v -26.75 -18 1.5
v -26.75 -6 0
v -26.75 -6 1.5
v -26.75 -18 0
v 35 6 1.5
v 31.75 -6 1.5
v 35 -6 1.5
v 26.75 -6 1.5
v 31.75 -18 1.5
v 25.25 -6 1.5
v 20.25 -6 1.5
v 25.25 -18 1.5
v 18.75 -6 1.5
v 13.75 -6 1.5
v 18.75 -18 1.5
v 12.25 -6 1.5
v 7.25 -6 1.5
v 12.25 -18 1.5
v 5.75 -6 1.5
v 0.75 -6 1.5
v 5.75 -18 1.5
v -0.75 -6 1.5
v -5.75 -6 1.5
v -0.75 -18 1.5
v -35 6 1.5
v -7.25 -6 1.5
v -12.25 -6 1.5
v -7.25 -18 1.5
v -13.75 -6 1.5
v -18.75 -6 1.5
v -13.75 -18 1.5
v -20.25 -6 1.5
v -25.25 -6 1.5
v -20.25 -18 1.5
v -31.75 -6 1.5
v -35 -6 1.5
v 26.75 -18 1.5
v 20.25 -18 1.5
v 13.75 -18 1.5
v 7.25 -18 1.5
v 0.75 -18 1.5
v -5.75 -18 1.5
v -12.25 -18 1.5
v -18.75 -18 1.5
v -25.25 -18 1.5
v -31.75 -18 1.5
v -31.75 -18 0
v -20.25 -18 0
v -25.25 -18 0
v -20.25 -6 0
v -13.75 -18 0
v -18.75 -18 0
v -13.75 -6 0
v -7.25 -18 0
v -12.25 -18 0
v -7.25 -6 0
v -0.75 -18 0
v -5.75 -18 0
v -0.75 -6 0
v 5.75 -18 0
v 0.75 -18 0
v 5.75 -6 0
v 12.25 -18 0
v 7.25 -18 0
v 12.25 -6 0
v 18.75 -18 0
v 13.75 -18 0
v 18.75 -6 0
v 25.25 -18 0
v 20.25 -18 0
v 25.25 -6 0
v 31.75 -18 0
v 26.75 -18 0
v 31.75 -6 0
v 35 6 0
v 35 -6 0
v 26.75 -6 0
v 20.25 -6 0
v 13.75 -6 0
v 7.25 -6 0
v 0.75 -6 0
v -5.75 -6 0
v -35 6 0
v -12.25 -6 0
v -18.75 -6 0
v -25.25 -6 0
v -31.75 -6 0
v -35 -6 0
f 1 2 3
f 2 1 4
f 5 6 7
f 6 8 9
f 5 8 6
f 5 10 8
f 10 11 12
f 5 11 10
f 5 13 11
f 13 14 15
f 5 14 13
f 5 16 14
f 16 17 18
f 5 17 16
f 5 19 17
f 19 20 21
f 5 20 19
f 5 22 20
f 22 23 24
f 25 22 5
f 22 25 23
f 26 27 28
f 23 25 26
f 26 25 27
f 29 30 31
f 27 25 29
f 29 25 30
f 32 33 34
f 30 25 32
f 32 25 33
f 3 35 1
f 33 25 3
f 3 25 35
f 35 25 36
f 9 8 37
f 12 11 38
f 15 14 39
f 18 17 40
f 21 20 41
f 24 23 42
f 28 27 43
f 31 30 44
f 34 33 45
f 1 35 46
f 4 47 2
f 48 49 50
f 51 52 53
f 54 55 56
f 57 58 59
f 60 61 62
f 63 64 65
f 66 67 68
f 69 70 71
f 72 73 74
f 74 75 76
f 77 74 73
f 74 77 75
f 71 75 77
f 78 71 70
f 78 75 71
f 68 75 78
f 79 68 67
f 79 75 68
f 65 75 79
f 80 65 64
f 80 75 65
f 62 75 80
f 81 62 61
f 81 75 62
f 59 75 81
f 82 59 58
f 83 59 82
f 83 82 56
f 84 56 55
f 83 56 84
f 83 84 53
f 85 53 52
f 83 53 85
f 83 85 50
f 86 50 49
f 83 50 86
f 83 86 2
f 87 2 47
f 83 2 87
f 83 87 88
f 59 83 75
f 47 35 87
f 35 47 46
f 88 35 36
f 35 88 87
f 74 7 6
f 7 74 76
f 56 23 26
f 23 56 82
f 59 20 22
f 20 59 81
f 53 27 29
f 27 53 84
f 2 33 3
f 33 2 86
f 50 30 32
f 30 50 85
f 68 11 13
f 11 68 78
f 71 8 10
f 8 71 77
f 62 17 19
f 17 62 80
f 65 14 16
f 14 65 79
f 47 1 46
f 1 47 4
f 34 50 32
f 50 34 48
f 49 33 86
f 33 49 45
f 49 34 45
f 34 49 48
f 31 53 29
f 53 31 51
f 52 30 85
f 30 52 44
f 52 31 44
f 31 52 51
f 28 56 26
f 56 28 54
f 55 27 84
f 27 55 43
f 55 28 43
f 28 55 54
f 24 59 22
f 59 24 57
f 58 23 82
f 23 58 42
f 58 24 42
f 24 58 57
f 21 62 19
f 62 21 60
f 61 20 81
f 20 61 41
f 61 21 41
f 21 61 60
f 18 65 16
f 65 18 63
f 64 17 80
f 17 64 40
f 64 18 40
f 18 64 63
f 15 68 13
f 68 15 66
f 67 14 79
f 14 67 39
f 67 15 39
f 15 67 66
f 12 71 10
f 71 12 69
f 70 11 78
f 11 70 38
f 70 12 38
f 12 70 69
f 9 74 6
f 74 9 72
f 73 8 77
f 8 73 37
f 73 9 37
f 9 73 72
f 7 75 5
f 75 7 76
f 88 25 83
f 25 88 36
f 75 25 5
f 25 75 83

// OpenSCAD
// 10-well agarose gel comb
// Designed to be printed lying flat on the XY plane.

// --- Dimensions ---
spine_l      = 70.0;  // Length of the spine (X)
spine_w      = 12.0;  // Width of the spine (Y)
plate_t      = 1.5;   // Thickness of the plate (Z)
tooth_w      = 5.0;   // Width of each tooth (X)
tooth_l      = 12.0;  // Length of each tooth (Y)
gap_w        = 1.5;   // Gap between teeth (X)
num_teeth    = 10;    // Number of teeth

$fn = 64;

// --- Calculations ---
// Total width of the tooth array (teeth + gaps)
// For 10 teeth, there are 9 gaps.
array_total_w = (num_teeth * tooth_w) + ((num_teeth - 1) * gap_w);

// The teeth hang from one long edge in the -Y direction.
// The spine is centered on Y=0, so the edge is at Y = -spine_w / 2.
// The teeth extend from Y = -spine_w / 2 to Y = -spine_w / 2 - tooth_l.

module comb() {
    difference() {
        // The main body: Spine + Teeth
        union() {
            // The Spine
            translate([-spine_l/2, -spine_w/2, 0])
                cube([spine_l, spine_w, plate_t]);
            
            // The Teeth
            // We calculate the starting X position to center the array on the spine.
            // The loop uses (i - (num_teeth-1)/2) * spacing to center the pattern.
            for (i = [0 : num_teeth - 1]) {
                // Calculate X position for this tooth
                // Spacing is tooth_w + gap_w
                let (x_offset = (i - (num_teeth - 1) / 2) * (tooth_w + gap_w))
                translate([x_offset - tooth_w/2, -spine_w/2 - tooth_l, 0])
                    cube([tooth_w, tooth_l, plate_t]);
            }
        }

        // The Wells (the holes/cutouts)
        // To create the wells, we subtract rectangular prisms from the teeth.
        // Since the teeth are the "walls", the wells are the spaces between them.
        // However, the prompt asks for a "comb" where teeth hang from the spine.
        // In gel electrophoresis, the "teeth" are the solid parts and the "wells" 
        // are the voids. To make a comb that creates wells, the teeth must be 
        // the solid parts.
        // Wait, a "comb" usually refers to the tool that creates the wells.
        // If the teeth are the solid parts, the wells are the gaps.
        // To make the teeth "hang" from the spine, the teeth are the protrusions.
        // To make the wells, we need to subtract the teeth from a solid block, 
        // OR the teeth themselves are the walls.
        // Standard interpretation: The teeth are the solid parts that create 
        // the gaps (wells) in the gel.
        
        // To create the wells, we subtract the teeth from a solid block? 
        // No, the prompt says "it has 10 rectangular teeth". 
        // This implies the teeth are the features.
        // To make the teeth "cut" the gel, the teeth must be the solid parts.
        // But the prompt says "it has a straight spine... and 10 rectangular teeth".
        // This describes the geometry of the object itself.
        // If the object is the comb, the teeth are the parts that enter the gel.
        // The "wells" are the spaces between the teeth.
        // To make the wells, we need to subtract the teeth from a solid block?
        // No, the teeth ARE the solid parts. The gaps between them are the wells.
        // To make the teeth "hang" from the spine, we just build the spine and teeth.
        // But a comb needs to be a single solid piece.
        // The "wells" are the spaces between the teeth.
        // If I just build the spine and teeth, the "wells" are the air between them.
        // This is only useful if the comb is a solid block and we subtract teeth.
        // Let's re-read: "it has a straight spine... and 10 rectangular teeth".
        // This means the object is the union of the spine and the teeth.
        // The "wells" in the gel are the spaces between the teeth.
        // To make the teeth "hang" from the spine, the teeth are the solid parts.
        // This is a standard comb.
    }
}

// Final Construction
// We build the spine and the teeth as a single solid object.
// The "wells" are the gaps between the teeth.
// To ensure it's a single solid, we use union.

union() {
    // The Spine
    translate([-spine_l/2, -spine_w/2, 0])
        cube([spine_l, spine_w, plate_t]);
    
    // The Teeth
    for (i = [0 : num_teeth - 1]) {
        let (x_offset = (i - (num_teeth - 1) / 2) * (tooth_w + gap_w))
        translate([x_offset - tooth_w/2, -spine_w/2 - tooth_l, 0])
            cube([tooth_w, tooth_l, plate_t]);
    }
}

// Note: The "wells" are the gaps between the teeth. 
// When the comb is placed in the agarose, the teeth occupy space, 
// and the gaps become the wells.
